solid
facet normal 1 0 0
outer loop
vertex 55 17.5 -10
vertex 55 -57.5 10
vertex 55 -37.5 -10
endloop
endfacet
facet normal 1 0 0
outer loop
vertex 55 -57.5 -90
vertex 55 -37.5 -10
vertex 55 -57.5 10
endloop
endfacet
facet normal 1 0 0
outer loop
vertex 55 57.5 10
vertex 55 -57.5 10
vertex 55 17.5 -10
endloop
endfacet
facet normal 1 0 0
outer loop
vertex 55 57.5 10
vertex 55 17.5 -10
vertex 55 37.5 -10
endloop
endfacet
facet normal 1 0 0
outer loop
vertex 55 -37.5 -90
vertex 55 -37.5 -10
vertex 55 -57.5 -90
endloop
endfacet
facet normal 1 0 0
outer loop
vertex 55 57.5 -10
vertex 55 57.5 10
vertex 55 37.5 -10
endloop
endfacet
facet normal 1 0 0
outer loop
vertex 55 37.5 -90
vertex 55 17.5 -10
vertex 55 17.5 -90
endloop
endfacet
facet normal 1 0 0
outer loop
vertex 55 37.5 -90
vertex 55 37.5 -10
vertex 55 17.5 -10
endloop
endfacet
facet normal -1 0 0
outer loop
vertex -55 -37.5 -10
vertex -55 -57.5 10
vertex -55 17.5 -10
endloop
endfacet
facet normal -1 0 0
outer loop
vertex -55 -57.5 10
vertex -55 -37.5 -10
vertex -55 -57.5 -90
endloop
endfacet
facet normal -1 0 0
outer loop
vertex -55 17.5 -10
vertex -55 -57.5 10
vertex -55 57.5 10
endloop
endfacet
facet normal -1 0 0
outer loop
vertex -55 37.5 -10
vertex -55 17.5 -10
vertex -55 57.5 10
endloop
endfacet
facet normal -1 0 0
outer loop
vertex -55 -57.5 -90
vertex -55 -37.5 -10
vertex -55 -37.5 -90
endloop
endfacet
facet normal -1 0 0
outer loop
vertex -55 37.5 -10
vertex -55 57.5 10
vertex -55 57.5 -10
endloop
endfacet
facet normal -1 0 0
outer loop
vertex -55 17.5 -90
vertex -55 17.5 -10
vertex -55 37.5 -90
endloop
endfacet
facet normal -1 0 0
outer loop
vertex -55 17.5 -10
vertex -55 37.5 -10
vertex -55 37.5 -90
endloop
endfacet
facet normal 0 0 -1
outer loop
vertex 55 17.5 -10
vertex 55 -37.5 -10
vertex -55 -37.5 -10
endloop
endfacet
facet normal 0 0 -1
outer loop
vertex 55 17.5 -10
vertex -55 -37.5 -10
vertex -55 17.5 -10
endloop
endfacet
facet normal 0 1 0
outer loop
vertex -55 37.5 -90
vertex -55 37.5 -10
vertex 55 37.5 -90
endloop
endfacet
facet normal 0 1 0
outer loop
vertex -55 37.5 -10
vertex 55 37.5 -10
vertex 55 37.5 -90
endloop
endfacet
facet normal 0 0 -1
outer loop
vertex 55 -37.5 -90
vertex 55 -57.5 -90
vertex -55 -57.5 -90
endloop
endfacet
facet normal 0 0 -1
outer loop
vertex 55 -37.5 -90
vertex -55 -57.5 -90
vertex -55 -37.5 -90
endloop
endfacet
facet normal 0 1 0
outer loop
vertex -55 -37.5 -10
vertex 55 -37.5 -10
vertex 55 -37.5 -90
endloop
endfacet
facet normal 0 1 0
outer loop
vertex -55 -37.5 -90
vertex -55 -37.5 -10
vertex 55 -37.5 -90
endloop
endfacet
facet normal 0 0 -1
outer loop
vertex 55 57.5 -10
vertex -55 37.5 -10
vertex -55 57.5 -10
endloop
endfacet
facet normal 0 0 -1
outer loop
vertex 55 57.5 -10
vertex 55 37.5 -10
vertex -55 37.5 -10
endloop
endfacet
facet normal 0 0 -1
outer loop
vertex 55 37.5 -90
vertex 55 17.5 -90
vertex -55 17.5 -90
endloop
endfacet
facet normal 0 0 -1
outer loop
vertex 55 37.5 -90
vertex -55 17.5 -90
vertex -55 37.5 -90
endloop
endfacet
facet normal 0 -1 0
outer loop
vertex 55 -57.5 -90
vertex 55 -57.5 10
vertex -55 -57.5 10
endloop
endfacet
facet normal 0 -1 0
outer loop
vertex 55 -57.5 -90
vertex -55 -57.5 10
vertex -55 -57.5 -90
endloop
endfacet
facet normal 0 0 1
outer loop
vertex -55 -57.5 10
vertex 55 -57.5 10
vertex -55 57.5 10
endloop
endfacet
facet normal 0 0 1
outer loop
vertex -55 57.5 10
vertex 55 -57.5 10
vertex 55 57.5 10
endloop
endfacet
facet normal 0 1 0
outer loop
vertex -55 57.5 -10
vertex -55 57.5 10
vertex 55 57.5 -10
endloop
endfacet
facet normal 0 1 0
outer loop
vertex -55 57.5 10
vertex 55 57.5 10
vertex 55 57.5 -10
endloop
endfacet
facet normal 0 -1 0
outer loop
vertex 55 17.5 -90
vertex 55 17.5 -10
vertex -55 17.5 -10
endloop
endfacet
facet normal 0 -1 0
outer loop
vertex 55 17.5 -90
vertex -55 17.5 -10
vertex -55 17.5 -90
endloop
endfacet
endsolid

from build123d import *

# Parameters (mm, degrees)
SKETCH_1_W      = 20
SKETCH_1_H      = 115
SKETCH_1_W_2    = 80
SKETCH_1_H_2    = 20
EXTRUDE_1_DEPTH = 55


with BuildPart() as part:
    # Эскиз1 → Бобышка-Вытянуть1 (new, symmetric)
    with BuildSketch(Plane(origin=(0, 0, 0), x_dir=(0, 0, -1), z_dir=(1, 0, 0))):
        Rectangle(SKETCH_1_W, SKETCH_1_H)
        with Locations((50, -47.5)):
            Rectangle(SKETCH_1_W_2, SKETCH_1_H_2)
        with Locations((50, 27.5)):
            Rectangle(SKETCH_1_W_2, SKETCH_1_H_2)
    extrude(amount=EXTRUDE_1_DEPTH, both=True)


solid = part.part
